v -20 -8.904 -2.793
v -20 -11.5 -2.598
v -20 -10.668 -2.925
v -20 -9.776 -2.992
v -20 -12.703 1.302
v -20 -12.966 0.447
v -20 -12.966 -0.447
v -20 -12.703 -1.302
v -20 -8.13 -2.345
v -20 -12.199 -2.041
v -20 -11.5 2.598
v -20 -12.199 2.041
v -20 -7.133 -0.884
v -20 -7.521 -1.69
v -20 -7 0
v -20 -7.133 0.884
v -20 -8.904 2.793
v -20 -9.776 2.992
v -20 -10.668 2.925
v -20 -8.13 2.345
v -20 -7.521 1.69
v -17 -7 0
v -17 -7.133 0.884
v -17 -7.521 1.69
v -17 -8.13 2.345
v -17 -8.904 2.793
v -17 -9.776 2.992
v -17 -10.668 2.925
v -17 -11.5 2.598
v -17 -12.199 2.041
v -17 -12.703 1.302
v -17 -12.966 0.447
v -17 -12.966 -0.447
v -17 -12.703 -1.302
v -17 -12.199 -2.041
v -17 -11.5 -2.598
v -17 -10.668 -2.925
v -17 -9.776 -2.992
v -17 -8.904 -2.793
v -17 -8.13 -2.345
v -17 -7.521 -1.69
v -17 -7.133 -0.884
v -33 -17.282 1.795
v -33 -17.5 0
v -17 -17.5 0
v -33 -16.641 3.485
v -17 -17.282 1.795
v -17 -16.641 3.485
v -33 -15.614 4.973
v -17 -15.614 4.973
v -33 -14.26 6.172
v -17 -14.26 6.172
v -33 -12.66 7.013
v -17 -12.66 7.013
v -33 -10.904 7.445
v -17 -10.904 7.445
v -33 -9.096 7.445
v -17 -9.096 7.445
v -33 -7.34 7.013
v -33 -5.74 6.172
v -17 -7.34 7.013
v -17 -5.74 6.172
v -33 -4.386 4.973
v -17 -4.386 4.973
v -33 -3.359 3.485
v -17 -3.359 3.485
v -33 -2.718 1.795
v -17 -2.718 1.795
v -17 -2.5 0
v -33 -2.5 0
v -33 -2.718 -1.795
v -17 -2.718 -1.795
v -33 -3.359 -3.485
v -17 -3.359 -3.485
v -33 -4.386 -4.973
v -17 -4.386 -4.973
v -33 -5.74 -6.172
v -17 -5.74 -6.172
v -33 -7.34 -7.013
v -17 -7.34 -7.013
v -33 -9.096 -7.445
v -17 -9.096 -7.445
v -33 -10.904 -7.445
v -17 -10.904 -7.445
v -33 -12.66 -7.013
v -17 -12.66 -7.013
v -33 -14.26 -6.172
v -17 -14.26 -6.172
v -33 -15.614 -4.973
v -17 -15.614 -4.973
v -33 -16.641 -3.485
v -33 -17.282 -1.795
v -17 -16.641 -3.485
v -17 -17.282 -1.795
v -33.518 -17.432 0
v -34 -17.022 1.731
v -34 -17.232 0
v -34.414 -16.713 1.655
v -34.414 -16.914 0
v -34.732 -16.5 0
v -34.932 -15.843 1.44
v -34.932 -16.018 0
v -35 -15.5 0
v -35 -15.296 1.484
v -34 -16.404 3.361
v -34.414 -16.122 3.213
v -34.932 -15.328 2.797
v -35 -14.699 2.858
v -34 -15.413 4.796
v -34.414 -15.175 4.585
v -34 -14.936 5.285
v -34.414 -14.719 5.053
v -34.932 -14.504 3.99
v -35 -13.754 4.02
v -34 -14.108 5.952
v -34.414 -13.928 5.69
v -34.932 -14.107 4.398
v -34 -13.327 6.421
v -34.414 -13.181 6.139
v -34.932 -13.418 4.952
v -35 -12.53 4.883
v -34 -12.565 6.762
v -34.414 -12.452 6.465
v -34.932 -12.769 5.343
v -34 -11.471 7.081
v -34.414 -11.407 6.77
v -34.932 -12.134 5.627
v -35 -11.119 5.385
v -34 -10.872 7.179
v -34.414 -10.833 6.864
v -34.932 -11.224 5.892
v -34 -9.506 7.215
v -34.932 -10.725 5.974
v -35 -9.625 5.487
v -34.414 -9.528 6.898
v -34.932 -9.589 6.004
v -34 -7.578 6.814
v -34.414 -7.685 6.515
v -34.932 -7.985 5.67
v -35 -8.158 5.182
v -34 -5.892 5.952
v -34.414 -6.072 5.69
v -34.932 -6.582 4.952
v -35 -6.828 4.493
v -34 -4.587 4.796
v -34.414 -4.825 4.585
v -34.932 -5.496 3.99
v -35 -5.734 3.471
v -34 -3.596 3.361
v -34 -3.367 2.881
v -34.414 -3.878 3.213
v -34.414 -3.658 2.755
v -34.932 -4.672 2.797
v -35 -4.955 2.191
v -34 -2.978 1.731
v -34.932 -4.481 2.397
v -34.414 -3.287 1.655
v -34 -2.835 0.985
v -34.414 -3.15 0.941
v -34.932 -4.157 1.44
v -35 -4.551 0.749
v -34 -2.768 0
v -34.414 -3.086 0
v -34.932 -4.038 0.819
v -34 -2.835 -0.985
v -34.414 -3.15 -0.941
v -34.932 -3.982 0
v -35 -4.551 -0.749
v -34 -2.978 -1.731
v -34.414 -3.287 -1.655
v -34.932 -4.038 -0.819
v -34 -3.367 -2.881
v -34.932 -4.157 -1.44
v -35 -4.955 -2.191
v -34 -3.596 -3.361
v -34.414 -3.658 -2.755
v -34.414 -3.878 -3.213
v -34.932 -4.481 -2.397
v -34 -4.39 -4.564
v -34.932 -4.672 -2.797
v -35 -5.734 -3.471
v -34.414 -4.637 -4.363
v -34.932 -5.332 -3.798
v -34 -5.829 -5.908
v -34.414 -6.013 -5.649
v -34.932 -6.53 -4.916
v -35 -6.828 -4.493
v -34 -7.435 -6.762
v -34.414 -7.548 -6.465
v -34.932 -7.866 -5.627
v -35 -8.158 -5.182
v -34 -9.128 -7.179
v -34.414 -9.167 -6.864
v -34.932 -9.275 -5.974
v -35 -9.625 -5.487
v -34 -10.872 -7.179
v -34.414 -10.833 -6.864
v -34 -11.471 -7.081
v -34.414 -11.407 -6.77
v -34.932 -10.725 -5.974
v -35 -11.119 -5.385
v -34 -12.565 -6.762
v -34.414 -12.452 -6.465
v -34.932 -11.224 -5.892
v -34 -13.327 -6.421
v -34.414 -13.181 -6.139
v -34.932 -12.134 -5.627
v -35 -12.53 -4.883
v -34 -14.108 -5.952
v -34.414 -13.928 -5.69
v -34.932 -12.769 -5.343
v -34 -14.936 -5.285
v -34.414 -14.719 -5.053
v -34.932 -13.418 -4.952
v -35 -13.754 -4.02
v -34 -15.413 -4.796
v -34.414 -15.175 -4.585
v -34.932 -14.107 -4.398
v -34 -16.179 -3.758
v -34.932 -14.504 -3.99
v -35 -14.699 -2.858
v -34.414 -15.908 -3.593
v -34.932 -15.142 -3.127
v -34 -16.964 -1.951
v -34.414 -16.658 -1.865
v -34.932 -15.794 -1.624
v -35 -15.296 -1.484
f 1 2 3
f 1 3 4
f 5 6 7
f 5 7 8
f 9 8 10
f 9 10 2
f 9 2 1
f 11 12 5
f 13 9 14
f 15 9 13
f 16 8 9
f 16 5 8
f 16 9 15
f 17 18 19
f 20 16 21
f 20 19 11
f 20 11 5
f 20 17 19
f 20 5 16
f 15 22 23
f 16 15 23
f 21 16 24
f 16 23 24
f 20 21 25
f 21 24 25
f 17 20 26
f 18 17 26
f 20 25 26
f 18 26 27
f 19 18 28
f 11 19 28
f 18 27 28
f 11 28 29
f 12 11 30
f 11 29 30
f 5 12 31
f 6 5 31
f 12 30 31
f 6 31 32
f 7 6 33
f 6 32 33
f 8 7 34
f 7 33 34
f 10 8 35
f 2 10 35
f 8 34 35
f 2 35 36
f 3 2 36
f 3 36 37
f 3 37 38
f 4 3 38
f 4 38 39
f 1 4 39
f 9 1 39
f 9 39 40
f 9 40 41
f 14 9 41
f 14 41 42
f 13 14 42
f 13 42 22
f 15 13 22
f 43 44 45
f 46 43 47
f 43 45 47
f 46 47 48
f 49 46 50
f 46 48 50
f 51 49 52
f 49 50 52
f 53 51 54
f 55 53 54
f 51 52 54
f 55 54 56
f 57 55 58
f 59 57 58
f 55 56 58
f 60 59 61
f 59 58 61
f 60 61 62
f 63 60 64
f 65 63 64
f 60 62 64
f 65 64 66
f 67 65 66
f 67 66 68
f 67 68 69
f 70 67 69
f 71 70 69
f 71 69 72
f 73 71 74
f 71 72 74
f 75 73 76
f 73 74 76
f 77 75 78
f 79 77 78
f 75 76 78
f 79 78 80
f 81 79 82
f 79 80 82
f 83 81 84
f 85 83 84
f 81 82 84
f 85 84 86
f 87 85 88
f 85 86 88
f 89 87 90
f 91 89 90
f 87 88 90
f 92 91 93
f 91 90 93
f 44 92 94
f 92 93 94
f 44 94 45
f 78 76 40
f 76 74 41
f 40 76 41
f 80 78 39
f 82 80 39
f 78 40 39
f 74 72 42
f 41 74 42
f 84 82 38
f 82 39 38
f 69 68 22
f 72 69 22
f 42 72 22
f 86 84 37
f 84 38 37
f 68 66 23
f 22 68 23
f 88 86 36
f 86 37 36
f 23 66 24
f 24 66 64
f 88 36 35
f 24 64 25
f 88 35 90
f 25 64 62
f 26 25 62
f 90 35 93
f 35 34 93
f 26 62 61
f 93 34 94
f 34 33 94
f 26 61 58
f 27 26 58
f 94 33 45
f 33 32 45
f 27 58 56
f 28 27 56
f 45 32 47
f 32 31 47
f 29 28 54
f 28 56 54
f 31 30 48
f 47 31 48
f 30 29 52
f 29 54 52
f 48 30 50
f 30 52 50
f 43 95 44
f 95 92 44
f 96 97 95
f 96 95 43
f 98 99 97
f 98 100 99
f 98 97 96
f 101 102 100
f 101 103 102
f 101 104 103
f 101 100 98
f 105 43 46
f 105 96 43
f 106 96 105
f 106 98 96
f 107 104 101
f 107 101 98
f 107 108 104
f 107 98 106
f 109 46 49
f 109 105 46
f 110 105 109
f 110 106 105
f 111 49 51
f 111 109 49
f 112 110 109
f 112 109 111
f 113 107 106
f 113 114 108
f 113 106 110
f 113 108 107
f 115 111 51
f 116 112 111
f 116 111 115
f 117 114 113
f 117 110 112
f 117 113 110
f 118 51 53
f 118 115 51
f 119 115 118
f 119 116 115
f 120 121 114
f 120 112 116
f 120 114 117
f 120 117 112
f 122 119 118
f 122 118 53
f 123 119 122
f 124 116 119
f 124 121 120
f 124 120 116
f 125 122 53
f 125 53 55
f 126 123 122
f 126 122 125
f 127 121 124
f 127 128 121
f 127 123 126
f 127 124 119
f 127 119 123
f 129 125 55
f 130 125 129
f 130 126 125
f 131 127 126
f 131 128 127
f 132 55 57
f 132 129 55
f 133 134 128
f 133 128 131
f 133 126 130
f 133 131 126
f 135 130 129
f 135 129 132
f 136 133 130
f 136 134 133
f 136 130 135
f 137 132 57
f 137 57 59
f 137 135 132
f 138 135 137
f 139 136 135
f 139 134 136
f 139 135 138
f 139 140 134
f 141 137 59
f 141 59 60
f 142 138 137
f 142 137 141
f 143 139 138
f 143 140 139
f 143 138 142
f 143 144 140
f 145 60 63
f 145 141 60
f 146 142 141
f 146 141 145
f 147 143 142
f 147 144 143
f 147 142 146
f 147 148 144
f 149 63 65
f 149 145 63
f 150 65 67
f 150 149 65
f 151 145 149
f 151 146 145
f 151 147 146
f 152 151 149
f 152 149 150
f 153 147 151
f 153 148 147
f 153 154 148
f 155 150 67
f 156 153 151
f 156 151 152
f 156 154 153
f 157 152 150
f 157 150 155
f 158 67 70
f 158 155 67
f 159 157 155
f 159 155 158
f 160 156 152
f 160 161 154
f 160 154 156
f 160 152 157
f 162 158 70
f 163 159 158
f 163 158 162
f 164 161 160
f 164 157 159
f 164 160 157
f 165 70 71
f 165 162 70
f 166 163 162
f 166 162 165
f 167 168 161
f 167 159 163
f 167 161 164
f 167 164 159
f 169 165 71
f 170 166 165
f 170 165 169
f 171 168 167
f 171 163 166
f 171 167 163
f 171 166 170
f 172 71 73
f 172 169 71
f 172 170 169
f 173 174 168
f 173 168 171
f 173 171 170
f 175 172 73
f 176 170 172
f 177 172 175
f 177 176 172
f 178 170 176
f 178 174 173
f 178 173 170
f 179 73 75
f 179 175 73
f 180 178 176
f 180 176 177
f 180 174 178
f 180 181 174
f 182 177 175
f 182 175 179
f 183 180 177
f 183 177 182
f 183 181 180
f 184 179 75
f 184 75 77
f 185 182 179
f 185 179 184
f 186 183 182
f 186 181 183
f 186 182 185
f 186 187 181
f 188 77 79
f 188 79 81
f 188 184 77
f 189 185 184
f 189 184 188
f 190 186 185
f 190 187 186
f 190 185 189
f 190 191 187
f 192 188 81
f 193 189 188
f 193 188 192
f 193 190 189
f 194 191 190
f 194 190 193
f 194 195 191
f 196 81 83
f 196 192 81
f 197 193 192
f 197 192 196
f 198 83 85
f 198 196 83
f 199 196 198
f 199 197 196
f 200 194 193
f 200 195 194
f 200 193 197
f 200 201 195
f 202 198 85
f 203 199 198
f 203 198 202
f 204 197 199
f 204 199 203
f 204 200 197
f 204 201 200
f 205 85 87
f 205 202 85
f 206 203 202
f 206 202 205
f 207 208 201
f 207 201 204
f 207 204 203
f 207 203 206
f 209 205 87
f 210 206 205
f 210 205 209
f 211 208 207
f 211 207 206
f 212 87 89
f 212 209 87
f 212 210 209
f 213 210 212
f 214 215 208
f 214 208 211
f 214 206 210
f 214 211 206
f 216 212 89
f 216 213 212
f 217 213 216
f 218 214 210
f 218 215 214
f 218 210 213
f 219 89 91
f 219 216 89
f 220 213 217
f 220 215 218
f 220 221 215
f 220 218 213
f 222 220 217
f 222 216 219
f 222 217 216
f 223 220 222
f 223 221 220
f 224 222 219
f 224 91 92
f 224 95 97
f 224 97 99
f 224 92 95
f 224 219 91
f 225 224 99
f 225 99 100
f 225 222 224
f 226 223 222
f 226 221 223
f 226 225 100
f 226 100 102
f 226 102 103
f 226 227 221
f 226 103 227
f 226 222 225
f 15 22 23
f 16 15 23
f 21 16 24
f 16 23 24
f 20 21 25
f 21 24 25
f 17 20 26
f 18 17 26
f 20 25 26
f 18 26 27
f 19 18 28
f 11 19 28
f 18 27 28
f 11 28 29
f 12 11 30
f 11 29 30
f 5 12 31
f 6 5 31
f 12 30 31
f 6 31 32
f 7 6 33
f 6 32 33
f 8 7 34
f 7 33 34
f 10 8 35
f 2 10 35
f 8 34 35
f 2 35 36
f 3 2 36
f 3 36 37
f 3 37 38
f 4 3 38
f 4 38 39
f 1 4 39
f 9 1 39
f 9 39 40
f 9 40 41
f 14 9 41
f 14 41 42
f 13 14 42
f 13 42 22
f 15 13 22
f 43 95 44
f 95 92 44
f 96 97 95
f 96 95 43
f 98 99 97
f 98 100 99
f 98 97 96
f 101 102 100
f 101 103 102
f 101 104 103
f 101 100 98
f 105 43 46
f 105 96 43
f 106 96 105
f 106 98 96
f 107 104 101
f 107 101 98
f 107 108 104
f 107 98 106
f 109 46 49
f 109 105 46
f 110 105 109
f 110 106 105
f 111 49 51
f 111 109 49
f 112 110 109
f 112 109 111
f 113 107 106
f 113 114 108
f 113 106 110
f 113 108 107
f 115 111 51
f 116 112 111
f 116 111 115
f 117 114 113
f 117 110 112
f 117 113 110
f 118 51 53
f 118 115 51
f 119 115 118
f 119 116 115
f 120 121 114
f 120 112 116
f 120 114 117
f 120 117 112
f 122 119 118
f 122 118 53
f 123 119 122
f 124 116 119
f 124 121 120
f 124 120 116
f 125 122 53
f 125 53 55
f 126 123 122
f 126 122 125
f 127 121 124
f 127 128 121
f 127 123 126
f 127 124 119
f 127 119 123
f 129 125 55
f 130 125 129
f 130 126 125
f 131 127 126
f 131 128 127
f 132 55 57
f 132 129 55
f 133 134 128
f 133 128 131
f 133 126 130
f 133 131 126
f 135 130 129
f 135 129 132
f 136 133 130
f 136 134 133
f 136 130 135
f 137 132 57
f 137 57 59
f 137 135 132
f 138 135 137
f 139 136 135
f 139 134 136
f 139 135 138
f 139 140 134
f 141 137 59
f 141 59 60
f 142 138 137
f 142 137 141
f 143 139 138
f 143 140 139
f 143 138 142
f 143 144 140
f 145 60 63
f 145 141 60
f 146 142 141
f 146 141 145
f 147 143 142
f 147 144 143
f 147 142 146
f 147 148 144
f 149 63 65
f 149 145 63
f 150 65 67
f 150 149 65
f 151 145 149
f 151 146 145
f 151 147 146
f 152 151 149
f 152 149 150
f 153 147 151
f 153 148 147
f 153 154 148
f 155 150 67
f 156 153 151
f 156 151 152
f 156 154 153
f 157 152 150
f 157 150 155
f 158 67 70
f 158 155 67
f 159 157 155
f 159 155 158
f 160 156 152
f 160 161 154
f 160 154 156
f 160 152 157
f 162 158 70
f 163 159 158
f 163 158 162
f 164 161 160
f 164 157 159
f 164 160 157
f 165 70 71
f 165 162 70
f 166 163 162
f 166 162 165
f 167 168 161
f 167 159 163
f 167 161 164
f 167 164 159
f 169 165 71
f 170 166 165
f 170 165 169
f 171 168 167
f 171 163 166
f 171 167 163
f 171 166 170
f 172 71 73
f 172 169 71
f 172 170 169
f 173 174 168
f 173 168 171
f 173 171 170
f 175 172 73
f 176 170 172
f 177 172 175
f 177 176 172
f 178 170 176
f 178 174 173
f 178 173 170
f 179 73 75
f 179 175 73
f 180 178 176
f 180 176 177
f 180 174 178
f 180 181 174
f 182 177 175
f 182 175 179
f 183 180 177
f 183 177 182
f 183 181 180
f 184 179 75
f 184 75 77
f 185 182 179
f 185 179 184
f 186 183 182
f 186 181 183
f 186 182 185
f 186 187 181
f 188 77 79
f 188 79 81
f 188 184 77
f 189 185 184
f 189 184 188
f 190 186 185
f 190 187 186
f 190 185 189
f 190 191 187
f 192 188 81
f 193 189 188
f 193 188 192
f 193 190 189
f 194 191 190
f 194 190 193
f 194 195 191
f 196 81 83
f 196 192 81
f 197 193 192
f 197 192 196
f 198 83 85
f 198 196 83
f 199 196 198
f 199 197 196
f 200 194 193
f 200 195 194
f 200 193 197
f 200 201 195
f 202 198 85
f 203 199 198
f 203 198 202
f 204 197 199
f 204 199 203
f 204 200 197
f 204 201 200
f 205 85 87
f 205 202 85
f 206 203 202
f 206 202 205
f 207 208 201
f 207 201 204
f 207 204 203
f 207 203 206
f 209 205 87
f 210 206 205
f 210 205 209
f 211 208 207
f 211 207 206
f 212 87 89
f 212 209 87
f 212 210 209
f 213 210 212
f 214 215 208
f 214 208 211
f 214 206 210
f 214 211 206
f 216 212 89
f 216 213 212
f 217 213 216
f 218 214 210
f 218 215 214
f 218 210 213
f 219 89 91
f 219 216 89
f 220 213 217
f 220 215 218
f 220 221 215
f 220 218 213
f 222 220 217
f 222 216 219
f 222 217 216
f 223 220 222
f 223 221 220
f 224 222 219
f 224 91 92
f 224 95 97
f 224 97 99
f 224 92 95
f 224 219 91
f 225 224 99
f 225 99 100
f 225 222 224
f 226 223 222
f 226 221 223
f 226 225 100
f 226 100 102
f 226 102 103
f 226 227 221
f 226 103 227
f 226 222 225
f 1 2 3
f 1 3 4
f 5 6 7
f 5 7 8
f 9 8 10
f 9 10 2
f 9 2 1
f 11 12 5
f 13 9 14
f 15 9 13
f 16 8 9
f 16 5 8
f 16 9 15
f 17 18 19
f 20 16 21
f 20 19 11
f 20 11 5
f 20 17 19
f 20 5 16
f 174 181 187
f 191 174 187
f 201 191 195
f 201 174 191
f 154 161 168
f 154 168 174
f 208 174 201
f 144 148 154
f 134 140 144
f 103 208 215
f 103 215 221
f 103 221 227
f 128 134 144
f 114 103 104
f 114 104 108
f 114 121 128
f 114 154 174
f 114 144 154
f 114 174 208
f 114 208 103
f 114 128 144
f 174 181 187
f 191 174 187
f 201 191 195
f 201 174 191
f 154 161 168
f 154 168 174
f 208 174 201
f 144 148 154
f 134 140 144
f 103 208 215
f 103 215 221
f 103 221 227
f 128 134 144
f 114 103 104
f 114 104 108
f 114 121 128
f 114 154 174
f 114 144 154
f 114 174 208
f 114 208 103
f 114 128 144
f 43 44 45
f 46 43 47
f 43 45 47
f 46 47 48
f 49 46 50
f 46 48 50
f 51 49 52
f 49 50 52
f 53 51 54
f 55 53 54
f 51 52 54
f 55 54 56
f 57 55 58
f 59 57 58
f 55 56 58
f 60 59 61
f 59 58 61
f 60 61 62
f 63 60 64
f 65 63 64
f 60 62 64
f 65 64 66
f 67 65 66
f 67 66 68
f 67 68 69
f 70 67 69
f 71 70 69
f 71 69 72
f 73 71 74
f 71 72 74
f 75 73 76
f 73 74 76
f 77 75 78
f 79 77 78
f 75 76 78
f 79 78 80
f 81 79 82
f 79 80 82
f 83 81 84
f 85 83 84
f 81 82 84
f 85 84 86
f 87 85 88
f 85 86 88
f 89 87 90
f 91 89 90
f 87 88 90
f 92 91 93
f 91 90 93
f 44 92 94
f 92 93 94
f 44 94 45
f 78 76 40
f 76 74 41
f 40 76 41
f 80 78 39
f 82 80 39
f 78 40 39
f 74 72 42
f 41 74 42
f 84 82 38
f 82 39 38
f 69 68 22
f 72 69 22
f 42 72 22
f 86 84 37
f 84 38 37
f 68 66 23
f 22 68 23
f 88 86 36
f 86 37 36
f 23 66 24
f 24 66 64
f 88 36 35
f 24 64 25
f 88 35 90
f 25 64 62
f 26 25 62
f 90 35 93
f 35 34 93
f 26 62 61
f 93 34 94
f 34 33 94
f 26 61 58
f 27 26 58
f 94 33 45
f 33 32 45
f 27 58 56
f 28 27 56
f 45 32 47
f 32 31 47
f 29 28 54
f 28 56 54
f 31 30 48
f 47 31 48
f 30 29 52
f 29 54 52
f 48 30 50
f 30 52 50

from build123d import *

# Parameters (mm, degrees)
F0_W      = 34
F0_H      = 24
F0_W_2    = 30
F0_H_2    = 20
F1_DEPTH  = 20
F2_R      = 6.5
F3_DEPTH  = 11.7
F4_R      = 7.5
F5_DEPTH  = 8.3
F6_R      = 7.5
F7_DEPTH  = 18
F8_R      = 2
F9_R      = 0.99999
F10_W     = 2
F10_H     = 20
F11_DEPTH = 25
F13_DEPTH = 15
F14_R     = 0.99999
F16_R     = 3
F17_DEPTH = 5
F18_W     = 40.3561908752
F18_H     = 35.6408245862
F20_DEPTH = 56.6
F21_DEPTH = 74.7


# Not quite as in the source:
# - a fillet or chamfer is up to 0.001 mm smaller than in the source, because OpenCascade refuses the exact size
# - a feature of the source that left no trace in its solid (it failed there, or was rolled back) is left out


with BuildPart() as f1:
    # F0 (on Front) → F1 (new body)
    with BuildSketch(Plane.XZ):
        Rectangle(F0_W, F0_H)
        Rectangle(F0_W_2, F0_H_2, mode=Mode.SUBTRACT)
    extrude(amount=F1_DEPTH)

    # F2 (on face) → F3 (cut)
    with BuildSketch(Plane.XY.offset(12)):
        with Locations((6, -10)):
            Circle(F2_R)
    extrude(amount=-F3_DEPTH, mode=Mode.SUBTRACT)

    # F4 (on face) → F5 (cut)
    with BuildSketch(Plane(origin=(0, 0, -12), x_dir=(1, 0, 0), z_dir=(0, 0, -1))):
        with Locations((-5, 10)):
            Circle(F4_R)
    extrude(amount=-F5_DEPTH, mode=Mode.SUBTRACT)

    # F6 (on face) → F7 (join)
    with BuildSketch(Plane(origin=(-17, 0, 0), x_dir=(0, -1, 0), z_dir=(-1, 0, 0))):
        with Locations((10, 0)):
            Circle(F6_R)
    extrude(amount=F7_DEPTH)

    # F8
    f8_edges = [f1.edges().sort_by_distance(p)[0] for p in [
        (-17, -10, 12),
        (-17, -10, -12),
        (-35, -2.5, 0),
    ]]
    fillet(f8_edges, radius=F8_R)

    # F9 (radius 1 in the source; OpenCascade refuses exactly that, so slightly less here)
    f9_edges = [f1.edges().sort_by_distance(p)[0] for p in [
        (-0.5, -10, 10),
        (-0.5, -10, 12),
        (-12.5, -10, -10),
        (-12.5, -10, -12),
    ]]
    fillet(f9_edges, radius=F9_R)

    # F10 (on face) → F11 (cut)
    with BuildSketch(Plane.XZ.offset(20)):
        with Locations((16, 0)):
            Rectangle(F10_W, F10_H)
    extrude(amount=-F11_DEPTH, mode=Mode.SUBTRACT)

    # F12 (on Right) → F13 (join, symmetric)
    with BuildSketch(Plane.YZ):
        with BuildLine():
            Line((-20, 10), (-20, 12))
            ThreePointArc((-20, 12), (-21, 11), (-20, 10))
        make_face()
        with BuildLine():
            Line((-19, 10), (-20, 10))
            ThreePointArc((-20, 10), (-19.5, 9.5), (-19, 10))
        make_face()
        with BuildLine():
            Line((-20, -12), (-20, -10))
            ThreePointArc((-20, -10), (-21, -11), (-20, -12))
        make_face()
        with BuildLine():
            Line((-19, -12), (-20, -12))
            ThreePointArc((-20, -12), (-19.5, -12.5), (-19, -12))
        make_face()
        with BuildLine():
            Line((0, -10), (0, -12))
            ThreePointArc((0, -12), (1, -11), (0, -10))
        make_face()
        with BuildLine():
            ThreePointArc((-1, -12), (-0.5, -12.5), (0, -12))
            Line((0, -12), (-1, -12))
        make_face()
        with BuildLine():
            Line((0, 12), (0, 10))
            ThreePointArc((0, 10), (1, 11), (0, 12))
        make_face()
        with BuildLine():
            ThreePointArc((-1, 10), (-0.5, 9.5), (0, 10))
            Line((0, 10), (-1, 10))
        make_face()
    extrude(amount=F13_DEPTH, both=True)

    # F14 (radius 1 in the source; OpenCascade refuses exactly that, so slightly less here)
    f14_edges = [f1.edges().sort_by_distance(p)[0] for p in [
        (15, -21, 11),
        (-15, -21, 11),
        (-15, -21, -11),
        (15, -21, -11),
        (-15, 1, 11),
        (-15, 1, -11),
        (15, 1, -11),
        (15, 1, 11),
    ]]
    fillet(f14_edges, radius=F14_R)

    # F16 (on face) → F17 (cut)
    with BuildSketch(Plane.YZ.offset(-15)):
        with Locations((-10, 0)):
            Circle(F16_R)
    extrude(amount=-F17_DEPTH, mode=Mode.SUBTRACT)


with BuildPart() as f19_1:
    # F19: copy of F1
    add(f1.part)


with BuildPart() as f20_tool:
    # F18 (on face) → F20 (new body)
    with BuildSketch(Plane(origin=(-17, 0, 0), x_dir=(0, -1, 0), z_dir=(-1, 0, 0))):
        with Locations((8.2543967292, -4.1322950274)):
            Rectangle(F18_W, F18_H)
    extrude(amount=-F20_DEPTH)


with BuildPart() as f1_1:
    add(f1.part)

    # F20: cut by f20_tool
    add(f20_tool.part, mode=Mode.SUBTRACT)

    # F18 (on face) → F21 (cut)
    with BuildSketch(Plane(origin=(-17, 0, 0), x_dir=(0, -1, 0), z_dir=(-1, 0, 0))):
        with Locations((8.2543967292, -4.1322950274)):
            Rectangle(F18_W, F18_H)
    extrude(amount=-F21_DEPTH, mode=Mode.SUBTRACT)


with BuildPart() as f19_1_1:
    add(f19_1.part)

    # F20: cut by f20_tool
    add(f20_tool.part, mode=Mode.SUBTRACT)


solid = Compound([f1_1.part, f19_1_1.part])
